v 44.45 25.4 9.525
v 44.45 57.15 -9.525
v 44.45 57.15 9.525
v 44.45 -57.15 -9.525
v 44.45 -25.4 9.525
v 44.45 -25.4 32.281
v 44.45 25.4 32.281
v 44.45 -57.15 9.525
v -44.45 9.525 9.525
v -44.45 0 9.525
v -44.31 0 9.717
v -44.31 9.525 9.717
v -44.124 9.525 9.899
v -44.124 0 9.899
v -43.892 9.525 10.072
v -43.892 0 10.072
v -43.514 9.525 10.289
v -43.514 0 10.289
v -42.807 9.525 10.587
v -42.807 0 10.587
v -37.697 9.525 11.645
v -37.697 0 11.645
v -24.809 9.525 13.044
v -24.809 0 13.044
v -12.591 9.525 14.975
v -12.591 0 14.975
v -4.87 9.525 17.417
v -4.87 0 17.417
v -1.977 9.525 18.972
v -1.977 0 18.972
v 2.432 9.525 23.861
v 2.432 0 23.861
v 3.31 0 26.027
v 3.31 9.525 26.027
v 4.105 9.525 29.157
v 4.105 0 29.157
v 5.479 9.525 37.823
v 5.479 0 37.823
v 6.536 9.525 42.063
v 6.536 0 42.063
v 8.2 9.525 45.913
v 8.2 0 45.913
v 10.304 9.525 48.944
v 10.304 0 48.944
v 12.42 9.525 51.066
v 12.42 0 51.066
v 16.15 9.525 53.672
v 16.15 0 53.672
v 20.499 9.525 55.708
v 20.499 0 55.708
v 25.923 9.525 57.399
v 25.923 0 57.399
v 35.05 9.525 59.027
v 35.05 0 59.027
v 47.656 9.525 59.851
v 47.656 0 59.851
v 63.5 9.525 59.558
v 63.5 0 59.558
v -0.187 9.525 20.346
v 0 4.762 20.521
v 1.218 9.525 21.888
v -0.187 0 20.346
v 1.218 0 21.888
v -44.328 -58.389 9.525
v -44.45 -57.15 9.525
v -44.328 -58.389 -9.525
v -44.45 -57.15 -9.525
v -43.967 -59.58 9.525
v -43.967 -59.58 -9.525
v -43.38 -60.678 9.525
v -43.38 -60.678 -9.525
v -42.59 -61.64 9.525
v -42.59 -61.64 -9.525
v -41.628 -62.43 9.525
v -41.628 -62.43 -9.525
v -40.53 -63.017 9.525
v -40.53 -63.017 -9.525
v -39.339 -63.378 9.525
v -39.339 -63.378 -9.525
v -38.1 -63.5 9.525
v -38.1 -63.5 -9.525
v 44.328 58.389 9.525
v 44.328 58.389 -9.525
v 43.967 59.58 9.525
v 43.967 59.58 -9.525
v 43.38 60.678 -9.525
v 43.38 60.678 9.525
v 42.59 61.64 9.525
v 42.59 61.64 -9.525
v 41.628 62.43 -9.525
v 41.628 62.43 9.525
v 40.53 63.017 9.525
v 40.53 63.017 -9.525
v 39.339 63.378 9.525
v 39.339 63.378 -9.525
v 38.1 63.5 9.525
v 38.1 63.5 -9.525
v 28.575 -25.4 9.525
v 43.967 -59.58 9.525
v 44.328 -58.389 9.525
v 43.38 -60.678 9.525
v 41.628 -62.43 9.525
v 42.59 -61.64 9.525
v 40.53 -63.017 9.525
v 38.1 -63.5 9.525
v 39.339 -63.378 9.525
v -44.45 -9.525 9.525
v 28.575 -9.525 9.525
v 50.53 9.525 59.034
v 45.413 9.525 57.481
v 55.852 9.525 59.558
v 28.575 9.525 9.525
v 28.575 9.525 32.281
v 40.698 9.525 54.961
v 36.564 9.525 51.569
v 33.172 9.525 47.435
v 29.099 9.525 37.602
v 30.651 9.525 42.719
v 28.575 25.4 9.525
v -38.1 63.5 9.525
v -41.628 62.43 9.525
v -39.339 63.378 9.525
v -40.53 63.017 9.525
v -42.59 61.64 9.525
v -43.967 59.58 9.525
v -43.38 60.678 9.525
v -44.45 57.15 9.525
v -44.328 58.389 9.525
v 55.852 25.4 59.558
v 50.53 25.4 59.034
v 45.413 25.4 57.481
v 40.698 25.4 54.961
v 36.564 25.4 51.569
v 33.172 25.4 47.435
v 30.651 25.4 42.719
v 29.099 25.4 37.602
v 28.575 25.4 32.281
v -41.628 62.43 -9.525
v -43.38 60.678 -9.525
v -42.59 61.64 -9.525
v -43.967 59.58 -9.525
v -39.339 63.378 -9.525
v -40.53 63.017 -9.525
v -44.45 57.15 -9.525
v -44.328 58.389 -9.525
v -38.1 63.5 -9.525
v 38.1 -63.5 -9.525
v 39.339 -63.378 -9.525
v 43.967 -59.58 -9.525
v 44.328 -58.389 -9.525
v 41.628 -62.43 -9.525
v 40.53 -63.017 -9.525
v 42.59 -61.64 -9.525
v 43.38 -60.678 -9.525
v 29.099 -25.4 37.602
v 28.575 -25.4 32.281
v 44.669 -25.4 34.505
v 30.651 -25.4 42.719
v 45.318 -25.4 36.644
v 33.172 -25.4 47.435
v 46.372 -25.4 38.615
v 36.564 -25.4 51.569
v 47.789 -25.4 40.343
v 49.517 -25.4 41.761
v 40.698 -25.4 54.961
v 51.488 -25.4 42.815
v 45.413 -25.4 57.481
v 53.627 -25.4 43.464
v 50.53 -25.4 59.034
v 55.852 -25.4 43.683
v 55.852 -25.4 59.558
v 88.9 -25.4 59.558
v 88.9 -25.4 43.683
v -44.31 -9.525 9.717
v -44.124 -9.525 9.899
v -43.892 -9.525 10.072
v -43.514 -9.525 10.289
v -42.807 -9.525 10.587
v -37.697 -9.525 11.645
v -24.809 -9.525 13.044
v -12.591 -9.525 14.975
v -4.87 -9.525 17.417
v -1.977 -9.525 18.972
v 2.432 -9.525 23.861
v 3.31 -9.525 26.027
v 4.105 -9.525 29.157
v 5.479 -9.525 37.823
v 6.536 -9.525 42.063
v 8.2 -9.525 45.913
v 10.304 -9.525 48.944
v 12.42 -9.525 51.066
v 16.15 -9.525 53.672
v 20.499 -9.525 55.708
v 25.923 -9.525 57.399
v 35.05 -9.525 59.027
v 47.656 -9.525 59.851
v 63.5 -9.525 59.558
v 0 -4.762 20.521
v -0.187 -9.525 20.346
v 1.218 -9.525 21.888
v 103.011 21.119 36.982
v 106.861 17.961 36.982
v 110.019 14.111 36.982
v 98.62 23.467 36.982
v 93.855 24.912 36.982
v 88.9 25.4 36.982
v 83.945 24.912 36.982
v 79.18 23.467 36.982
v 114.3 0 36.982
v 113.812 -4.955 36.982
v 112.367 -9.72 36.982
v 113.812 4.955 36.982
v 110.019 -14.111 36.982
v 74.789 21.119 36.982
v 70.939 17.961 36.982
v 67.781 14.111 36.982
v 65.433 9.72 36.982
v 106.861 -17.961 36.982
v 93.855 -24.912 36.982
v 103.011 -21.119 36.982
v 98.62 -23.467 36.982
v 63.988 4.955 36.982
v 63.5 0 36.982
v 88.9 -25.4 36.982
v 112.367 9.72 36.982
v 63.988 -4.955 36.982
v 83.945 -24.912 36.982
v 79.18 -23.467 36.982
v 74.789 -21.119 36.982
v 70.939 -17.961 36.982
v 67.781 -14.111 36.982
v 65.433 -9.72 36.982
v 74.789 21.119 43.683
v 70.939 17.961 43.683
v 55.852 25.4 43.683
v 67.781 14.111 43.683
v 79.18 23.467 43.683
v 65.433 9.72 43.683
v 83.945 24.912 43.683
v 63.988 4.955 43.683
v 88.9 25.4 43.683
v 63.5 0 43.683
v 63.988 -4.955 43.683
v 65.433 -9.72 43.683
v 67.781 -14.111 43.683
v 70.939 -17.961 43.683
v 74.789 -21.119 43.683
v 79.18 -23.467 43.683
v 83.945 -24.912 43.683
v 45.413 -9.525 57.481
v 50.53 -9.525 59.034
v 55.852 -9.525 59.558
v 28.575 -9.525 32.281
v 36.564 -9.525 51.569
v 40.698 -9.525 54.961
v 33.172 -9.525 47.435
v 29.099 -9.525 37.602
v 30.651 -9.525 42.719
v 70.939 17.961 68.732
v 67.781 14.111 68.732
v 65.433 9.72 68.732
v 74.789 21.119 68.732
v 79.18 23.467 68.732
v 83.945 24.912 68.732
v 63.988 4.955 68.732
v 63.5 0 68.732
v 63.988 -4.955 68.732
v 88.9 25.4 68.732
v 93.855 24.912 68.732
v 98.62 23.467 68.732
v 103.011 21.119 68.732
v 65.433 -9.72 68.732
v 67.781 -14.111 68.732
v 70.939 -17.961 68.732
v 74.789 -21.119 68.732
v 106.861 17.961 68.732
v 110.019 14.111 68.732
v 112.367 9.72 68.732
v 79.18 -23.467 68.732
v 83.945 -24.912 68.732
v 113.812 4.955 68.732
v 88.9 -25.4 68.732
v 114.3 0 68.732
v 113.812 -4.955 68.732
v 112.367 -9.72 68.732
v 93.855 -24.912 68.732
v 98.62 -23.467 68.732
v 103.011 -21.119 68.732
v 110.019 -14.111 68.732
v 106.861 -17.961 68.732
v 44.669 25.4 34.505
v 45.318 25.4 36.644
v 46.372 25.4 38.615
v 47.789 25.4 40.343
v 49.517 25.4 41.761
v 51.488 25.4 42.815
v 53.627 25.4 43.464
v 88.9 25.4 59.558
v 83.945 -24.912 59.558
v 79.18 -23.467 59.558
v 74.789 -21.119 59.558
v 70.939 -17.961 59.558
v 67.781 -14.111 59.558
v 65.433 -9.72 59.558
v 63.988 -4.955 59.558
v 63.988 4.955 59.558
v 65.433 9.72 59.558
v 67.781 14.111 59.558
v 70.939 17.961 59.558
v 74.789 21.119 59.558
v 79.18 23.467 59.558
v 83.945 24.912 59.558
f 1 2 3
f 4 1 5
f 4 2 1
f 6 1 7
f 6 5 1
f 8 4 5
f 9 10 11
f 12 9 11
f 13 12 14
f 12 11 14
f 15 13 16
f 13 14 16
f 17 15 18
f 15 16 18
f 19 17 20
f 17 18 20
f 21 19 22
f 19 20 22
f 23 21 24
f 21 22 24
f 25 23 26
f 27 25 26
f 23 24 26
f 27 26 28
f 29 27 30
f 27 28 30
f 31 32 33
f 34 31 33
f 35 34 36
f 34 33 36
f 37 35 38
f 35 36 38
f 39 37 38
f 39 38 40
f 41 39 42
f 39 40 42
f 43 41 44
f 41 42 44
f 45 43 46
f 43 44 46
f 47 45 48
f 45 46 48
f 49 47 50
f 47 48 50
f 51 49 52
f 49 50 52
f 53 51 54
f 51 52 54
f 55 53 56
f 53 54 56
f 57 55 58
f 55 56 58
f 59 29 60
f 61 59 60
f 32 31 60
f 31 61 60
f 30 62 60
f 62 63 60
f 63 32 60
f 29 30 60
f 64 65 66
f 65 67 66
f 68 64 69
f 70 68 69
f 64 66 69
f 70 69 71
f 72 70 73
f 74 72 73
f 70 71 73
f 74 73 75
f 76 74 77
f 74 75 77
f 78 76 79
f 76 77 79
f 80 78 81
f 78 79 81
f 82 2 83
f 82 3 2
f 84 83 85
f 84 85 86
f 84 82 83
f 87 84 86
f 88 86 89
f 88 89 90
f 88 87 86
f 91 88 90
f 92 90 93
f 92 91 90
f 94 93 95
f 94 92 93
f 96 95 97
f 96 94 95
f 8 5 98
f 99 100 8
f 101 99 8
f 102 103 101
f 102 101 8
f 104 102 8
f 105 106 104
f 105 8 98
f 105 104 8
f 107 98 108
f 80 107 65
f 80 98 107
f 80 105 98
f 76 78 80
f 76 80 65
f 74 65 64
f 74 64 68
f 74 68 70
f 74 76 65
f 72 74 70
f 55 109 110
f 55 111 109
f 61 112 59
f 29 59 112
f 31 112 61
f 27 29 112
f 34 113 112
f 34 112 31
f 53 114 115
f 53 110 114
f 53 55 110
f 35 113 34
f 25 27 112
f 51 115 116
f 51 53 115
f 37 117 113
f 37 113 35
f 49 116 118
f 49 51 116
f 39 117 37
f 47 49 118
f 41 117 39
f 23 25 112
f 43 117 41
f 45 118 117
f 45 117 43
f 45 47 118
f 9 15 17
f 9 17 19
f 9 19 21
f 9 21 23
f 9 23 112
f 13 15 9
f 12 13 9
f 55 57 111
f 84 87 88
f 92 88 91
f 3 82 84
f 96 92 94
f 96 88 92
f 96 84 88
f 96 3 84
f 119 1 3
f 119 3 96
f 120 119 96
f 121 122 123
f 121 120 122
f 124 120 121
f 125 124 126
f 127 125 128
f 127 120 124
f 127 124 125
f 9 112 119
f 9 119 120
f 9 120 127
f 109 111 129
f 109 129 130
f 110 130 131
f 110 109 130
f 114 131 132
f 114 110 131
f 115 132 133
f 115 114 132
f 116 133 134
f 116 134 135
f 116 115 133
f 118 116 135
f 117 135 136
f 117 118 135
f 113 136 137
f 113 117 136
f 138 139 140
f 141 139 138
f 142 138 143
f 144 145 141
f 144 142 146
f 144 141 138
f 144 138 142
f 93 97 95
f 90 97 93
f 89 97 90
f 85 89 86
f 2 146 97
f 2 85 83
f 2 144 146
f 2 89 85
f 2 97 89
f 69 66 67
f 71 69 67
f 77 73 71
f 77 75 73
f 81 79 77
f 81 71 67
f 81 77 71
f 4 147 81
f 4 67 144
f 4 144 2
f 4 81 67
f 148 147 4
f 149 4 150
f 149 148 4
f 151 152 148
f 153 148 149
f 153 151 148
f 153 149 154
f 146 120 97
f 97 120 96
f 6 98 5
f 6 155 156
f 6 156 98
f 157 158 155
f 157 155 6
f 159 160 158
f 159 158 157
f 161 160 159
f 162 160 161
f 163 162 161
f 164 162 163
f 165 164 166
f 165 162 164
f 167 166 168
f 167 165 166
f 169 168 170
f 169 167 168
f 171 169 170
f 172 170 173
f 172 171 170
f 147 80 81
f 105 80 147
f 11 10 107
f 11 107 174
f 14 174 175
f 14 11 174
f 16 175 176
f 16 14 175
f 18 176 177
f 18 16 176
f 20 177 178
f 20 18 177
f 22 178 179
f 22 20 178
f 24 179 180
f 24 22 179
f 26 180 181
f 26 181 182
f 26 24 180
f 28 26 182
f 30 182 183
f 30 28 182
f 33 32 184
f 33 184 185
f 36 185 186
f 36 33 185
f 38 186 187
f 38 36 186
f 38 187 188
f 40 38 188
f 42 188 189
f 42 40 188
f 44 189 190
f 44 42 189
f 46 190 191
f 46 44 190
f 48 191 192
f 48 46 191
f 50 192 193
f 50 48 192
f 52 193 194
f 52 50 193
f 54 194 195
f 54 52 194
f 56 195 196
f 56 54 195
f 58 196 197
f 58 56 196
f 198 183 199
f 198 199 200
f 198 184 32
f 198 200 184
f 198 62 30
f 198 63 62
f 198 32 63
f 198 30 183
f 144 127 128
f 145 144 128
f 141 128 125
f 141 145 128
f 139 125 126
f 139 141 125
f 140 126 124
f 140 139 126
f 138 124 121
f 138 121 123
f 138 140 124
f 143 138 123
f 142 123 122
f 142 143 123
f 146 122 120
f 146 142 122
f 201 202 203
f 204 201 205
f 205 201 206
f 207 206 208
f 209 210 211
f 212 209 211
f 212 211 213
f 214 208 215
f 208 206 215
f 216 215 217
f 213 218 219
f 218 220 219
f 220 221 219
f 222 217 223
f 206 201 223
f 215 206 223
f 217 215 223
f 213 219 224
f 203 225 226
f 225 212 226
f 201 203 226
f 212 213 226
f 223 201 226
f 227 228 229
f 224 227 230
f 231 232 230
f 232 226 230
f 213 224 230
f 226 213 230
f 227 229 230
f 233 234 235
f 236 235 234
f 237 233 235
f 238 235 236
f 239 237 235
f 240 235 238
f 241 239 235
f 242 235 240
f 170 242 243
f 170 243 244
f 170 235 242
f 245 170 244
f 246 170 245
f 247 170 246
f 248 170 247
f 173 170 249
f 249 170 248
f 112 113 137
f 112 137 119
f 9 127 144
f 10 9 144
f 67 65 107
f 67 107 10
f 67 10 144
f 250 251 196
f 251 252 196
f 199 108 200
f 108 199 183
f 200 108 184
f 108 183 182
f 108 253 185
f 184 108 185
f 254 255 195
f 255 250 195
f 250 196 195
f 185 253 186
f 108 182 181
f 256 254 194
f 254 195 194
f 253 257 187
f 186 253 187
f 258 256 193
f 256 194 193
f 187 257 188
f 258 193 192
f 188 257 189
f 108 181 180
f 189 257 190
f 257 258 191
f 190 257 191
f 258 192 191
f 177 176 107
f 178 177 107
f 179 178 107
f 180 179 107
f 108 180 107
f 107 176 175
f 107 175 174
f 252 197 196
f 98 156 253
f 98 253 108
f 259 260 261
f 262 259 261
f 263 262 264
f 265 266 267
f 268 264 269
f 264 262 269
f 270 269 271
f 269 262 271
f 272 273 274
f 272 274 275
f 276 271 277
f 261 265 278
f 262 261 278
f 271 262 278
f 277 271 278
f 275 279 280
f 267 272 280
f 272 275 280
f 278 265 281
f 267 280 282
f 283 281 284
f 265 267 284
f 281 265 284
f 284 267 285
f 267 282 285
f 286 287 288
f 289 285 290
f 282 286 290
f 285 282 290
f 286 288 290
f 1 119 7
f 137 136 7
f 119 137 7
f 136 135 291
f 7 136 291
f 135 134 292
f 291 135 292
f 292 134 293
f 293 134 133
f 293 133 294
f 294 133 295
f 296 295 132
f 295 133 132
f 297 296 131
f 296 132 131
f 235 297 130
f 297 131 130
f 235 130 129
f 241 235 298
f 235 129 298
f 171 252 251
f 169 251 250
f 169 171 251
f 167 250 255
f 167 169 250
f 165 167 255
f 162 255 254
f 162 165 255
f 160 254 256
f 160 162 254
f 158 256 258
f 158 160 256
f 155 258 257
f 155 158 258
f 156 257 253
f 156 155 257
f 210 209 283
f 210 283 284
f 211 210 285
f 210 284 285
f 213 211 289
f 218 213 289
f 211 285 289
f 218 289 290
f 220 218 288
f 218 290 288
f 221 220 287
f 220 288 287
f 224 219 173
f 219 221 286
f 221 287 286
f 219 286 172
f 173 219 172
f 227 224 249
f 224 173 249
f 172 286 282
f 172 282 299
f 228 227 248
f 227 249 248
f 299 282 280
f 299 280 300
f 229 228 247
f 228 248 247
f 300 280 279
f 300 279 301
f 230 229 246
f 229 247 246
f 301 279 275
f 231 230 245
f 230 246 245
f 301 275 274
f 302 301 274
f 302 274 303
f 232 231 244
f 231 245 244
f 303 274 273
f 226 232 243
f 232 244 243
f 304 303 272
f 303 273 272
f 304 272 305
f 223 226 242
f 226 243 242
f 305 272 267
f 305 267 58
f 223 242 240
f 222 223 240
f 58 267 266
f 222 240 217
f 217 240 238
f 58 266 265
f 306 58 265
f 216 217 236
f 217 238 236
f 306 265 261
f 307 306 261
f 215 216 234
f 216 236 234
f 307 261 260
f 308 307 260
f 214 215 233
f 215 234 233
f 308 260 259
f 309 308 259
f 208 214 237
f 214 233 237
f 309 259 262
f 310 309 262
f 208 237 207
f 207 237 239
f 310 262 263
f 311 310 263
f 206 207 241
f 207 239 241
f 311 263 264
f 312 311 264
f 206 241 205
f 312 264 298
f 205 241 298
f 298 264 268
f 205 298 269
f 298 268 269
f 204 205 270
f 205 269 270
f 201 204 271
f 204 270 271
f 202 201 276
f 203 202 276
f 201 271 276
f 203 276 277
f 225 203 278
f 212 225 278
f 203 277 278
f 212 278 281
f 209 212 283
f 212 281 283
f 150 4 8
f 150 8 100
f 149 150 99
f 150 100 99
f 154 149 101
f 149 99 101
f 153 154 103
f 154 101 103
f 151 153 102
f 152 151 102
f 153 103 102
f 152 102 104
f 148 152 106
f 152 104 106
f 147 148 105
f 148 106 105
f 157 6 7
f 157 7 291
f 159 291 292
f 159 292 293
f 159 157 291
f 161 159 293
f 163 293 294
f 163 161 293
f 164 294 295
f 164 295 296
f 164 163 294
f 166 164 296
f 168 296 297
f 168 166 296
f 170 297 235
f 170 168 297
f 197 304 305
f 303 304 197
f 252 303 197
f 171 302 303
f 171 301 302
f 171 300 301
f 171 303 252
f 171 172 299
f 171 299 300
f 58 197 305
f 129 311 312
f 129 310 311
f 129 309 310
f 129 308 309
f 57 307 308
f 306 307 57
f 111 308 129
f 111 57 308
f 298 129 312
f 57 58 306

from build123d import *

# Parameters (mm, degrees)
F1_DEPTH = 63.5
F0_W     = 25.4
F0_H     = 15.875
F2_DEPTH = 25.4
F3_DEPTH = 9.525
F5_R     = 6.35


with BuildPart() as f1:
    # F0 (on Front) → F1 (new body, symmetric)
    with BuildSketch(Plane.XZ):
        Polygon((-44.45, -9.525), (44.45, -9.525), (44.45, 9.525), (28.575, 9.525), (-44.45, 9.525), align=None)
    extrude(amount=F1_DEPTH, both=True)

    # F0 (on Front) → F2 (join, symmetric)
    with BuildSketch(Plane.XZ):
        with BuildLine():
            Line((28.575, 9.525), (44.45, 9.525))
            Line((44.45, 9.525), (44.45, 32.2810681378))
            ThreePointArc((44.45, 32.2810681378), (47.7894660102, 40.3432522706), (55.851650143, 43.6827182808))
            Line((55.851650143, 43.6827182808), (63.5, 43.6827182808))
            Line((63.5, 43.6827182808), (63.5, 59.5577182808))
            Line((63.5, 59.5577182808), (55.851650143, 59.5577182808))
            ThreePointArc((55.851650143, 59.5577182808), (36.5641458588, 51.568572422), (28.575, 32.2810681378))
            Line((28.575, 32.2810681378), (28.575, 9.525))
        make_face()
        with Locations((76.2, 51.6202182808)):
            Rectangle(F0_W, F0_H)
    extrude(amount=F2_DEPTH, both=True)

    # F0 (on Front) → F3 (join, symmetric)
    with BuildSketch(Plane.XZ):
        with BuildLine():
            add(Edge.make_bspline(
                [(-44.45, 9.525), (-42.0993748289, 13.5310159807), (31.447590693, 8.169184866), (-11.7146146139, 63.4179972105), (63.5, 59.5577182808)],
                knots=[0, 0, 0, 0, 0.4393913897, 1, 1, 1, 1], degree=3))
            Line((-44.45, 9.525), (28.575, 9.525))
            Line((28.575, 9.525), (28.575, 32.2810681378))
            ThreePointArc((28.575, 32.2810681378), (36.5641458588, 51.568572422), (55.851650143, 59.5577182808))
            Line((55.851650143, 59.5577182808), (63.5, 59.5577182808))
        make_face()
    extrude(amount=F3_DEPTH, both=True)

    # F0 (on Front) → F4 (revolve)
    with BuildSketch(Plane.XZ):
        Polygon((88.9, 68.7322870837), (88.9, 59.5577182808), (88.9, 43.6827182808), (88.9, 36.9822870837), (114.3, 36.9822870837), (114.3, 68.7322870837), align=None)
    revolve(axis=Axis((88.9, 0, 52.8572870837), (0, 0, -1)))

    # F5
    f5_edges = [f1.edges().sort_by_distance(p)[0] for p in [
        (-44.45, -63.5, 0),
        (44.45, -63.5, 0),
        (44.45, 63.5, 0),
        (-44.45, 63.5, 0),
    ]]
    fillet(f5_edges, radius=F5_R)


solid = f1.part
